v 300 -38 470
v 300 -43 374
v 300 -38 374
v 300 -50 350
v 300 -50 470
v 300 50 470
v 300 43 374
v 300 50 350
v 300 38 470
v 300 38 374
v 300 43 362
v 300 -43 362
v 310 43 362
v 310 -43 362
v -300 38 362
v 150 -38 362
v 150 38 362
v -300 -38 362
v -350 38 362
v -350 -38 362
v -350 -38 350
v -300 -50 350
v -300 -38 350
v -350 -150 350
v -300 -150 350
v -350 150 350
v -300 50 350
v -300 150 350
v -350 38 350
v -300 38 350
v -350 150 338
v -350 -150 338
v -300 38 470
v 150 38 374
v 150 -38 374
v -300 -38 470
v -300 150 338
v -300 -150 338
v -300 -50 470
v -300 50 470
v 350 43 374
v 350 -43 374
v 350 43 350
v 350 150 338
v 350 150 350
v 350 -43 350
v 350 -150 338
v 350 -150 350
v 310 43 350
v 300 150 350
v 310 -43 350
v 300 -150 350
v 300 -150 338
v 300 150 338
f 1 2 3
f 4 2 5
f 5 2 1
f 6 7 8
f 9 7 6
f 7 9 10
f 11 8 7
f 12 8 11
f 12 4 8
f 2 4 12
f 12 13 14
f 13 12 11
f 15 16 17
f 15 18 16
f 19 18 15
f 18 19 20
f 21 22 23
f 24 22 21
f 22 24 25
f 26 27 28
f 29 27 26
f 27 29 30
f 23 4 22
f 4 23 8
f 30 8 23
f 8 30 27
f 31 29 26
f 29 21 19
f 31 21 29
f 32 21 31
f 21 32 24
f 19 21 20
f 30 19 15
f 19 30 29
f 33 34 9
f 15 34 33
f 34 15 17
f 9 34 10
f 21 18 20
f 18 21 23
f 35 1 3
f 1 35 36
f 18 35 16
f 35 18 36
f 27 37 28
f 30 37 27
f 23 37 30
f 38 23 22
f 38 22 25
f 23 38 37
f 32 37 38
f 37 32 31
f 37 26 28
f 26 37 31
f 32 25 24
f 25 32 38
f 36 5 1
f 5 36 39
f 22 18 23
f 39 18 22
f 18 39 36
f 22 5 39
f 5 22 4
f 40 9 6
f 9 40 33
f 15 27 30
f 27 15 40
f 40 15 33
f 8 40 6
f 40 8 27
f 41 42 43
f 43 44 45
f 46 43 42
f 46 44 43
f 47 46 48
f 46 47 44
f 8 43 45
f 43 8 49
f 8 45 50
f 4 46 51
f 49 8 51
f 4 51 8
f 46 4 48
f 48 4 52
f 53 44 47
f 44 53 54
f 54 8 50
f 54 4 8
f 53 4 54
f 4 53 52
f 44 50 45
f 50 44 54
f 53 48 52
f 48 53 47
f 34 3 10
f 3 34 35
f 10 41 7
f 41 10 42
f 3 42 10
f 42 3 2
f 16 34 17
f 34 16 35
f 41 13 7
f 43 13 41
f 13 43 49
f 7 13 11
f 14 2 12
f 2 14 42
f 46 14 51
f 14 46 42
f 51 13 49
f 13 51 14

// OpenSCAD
//Параллельный упор для стола
tableWidth = 600;
tableHeight = 700;
tableDepth = 500;
ft = 12; //фанеры thickness

module table () {
    color ("pink", 0.3){
        cube(size = [tableWidth, tableDepth, tableHeight], center=true);
    }
}

module parralelStop() { 
    leftPart = 50;
    stopWidth = 100;
    //горизонтальная базовая палка
    translate([-leftPart-tableWidth/2,-stopWidth/2 + ft, tableHeight/2]) {
        cube(size = [leftPart + tableWidth, stopWidth - 2*ft ,ft]);
    }
    //левая направляющая
    leftPartSize = 300;
    translate([-leftPart-tableWidth/2,-leftPartSize/2, tableHeight/2-ft]) {
        cube(size = [leftPart,leftPartSize,ft]);
    }
    //площадки упора
    standHeight = 120;
    translate([-tableWidth/2,-stopWidth/2, tableHeight/2]) {
        cube(size = [tableWidth,ft,standHeight]);
    }
    translate([-tableWidth/2, stopWidth/2-ft, tableHeight/2]) {
        cube(size = [tableWidth,ft,standHeight]);
    }
    //правая часть
    //направляющая
    translate([tableWidth/2,-leftPartSize/2, tableHeight/2-ft]) {
        cube(size = [leftPart,leftPartSize,ft]);
    }
    //ширина
    rightWidth = 200;
    //глубина пазов
    groveDepth = 5;
    //Деталь1
    d1x = rightWidth;
    d1y = stopWidth - 2*ft + 2*groveDepth;
    translate([tableWidth/2-d1x + leftPart, -d1y/2, tableHeight/2+ft]) {
        cube(size = [d1x,d1y,ft]);
    }
    //Деталь2
    d2x = leftPart-10;
    d2y = stopWidth - 2*ft + 2*groveDepth;
    #translate([tableWidth/2-d2x + leftPart, -d2y/2, tableHeight/2]) {
        cube(size = [d2x,d2y,ft]);
    }
}

//
//table(); 
parralelStop();
